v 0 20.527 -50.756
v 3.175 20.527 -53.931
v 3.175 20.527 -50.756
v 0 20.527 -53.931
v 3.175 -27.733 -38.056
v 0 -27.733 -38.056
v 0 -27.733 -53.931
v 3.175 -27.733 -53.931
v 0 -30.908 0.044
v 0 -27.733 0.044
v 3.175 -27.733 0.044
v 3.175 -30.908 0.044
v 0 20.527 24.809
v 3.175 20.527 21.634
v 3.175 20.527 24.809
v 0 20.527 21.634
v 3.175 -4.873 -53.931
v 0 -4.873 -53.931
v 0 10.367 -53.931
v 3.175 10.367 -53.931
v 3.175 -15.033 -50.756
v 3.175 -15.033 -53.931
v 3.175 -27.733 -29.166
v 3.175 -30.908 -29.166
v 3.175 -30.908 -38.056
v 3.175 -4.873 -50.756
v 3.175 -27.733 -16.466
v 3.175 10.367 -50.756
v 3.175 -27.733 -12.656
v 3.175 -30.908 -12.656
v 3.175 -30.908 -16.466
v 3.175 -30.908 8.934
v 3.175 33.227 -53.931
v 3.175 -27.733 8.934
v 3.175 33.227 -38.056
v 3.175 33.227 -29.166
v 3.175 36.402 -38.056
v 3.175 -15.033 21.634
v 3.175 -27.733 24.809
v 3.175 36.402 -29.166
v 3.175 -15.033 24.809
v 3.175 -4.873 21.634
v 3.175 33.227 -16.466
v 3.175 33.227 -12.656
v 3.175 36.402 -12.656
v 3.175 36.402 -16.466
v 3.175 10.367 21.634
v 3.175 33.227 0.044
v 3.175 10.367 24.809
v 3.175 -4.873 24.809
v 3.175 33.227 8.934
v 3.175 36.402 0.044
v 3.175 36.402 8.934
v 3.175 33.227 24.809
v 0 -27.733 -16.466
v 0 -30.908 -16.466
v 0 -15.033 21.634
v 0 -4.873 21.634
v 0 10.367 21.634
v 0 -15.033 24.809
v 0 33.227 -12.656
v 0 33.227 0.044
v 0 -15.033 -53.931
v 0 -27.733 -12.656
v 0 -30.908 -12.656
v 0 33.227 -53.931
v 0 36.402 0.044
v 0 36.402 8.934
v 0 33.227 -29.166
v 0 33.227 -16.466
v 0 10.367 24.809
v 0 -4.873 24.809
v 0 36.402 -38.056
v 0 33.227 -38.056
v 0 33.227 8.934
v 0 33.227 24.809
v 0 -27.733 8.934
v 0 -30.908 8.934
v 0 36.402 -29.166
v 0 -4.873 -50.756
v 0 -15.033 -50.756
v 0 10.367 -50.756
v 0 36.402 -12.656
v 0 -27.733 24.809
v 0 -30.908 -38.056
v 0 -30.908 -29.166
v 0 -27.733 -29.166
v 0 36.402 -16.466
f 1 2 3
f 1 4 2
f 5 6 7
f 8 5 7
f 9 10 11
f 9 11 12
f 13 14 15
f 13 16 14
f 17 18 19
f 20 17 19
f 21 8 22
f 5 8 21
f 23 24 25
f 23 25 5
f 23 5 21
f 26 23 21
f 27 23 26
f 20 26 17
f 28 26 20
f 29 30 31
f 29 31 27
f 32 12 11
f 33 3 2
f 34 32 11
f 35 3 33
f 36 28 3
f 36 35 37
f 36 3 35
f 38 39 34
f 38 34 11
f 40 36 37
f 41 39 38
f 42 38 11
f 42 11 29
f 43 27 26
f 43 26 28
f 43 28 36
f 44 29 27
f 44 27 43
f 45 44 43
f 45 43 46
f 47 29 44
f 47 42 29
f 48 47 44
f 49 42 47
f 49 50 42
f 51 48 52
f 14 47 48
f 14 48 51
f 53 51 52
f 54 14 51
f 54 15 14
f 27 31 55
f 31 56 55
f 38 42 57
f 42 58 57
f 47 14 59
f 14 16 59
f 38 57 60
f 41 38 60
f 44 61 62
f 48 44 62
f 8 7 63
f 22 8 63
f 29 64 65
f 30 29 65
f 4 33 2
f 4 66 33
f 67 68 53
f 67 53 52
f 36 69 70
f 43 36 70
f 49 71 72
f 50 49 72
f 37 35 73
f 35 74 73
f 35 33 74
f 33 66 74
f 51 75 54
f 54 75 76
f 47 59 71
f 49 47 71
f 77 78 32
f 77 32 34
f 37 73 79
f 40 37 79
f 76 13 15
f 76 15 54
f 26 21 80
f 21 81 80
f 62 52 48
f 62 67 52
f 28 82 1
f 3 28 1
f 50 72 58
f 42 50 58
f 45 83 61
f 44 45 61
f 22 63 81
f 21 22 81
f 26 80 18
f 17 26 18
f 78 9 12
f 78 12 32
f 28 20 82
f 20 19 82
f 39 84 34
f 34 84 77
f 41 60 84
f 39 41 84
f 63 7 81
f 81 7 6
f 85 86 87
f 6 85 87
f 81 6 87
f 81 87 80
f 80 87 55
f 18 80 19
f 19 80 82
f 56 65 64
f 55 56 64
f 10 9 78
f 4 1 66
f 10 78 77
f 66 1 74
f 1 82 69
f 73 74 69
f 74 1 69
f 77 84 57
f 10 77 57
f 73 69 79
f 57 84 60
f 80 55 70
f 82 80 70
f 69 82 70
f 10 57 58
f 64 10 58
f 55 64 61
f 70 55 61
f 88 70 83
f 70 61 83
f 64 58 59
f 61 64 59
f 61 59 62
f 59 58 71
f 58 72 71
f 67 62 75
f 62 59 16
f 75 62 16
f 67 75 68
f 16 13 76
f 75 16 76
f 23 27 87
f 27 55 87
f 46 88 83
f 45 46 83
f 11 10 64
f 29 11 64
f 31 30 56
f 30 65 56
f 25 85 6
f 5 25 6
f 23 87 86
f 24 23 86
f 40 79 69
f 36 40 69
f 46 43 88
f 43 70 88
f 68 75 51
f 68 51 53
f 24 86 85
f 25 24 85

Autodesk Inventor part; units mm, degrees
ref_plane "YZ Plane" through (0, 0, 0) normal (1, 0, 0) x (0, 1, 0)
ref_plane "XZ Plane" through (0, 0, 0) normal (0, 1, 0) x (-1, 0, 0)
ref_plane "XY Plane" through (0, 0, 0) normal (0, 0, 1) x (1, 0, 0)
sketch "Sketch1" plane through (0, 0, 0) normal (1, 0, 0) x (0, 1, 0)
  line L0 (33.2271, 21.6336) -> (-27.7329, 21.6336)
  line L1 (-27.7329, 21.6336) -> (-27.7329, -50.7564)
  line L2 (-27.7329, -50.7564) -> (33.2271, -50.7564)
  line L3 (33.2271, -50.7564) -> (33.2271, 21.6336)
  line L4 (33.2271, -38.0564) -> (36.4021, -38.0564)
  line L5 (36.4021, -38.0564) -> (36.4021, -29.1664)
  line L6 (36.4021, -29.1664) -> (33.2271, -29.1664)
  line L7 (33.2271, -29.1664) -> (33.2271, -38.0564)
  line L8 (33.2271, 8.9336) -> (36.4021, 8.9336)
  line L9 (36.4021, 8.9336) -> (36.4021, 0.0436)
  line L10 (36.4021, 0.0436) -> (33.2271, 0.0436)
  line L11 (33.2271, 0.0436) -> (33.2271, 8.9336)
  line L12 (33.2271, -16.4664) -> (36.4021, -16.4664)
  line L13 (36.4021, -16.4664) -> (36.4021, -12.6564)
  line L14 (36.4021, -12.6564) -> (33.2271, -12.6564)
  line L15 (33.2271, -12.6564) -> (33.2271, -16.4664)
  line L16 (33.2271, 21.6336) -> (20.5271, 21.6336)
  line L17 (20.5271, 21.6336) -> (20.5271, 24.8086)
  line L18 (20.5271, 24.8086) -> (33.2271, 24.8086)
  line L19 (33.2271, 24.8086) -> (33.2271, 21.6336)
  line L20 (-27.7329, 21.6336) -> (-15.0329, 21.6336)
  line L21 (-15.0329, 21.6336) -> (-15.0329, 24.8086)
  line L22 (-15.0329, 24.8086) -> (-27.7329, 24.8086)
  line L23 (-27.7329, 24.8086) -> (-27.7329, 21.6336)
  line L24 (-4.8729, 21.6336) -> (10.3671, 21.6336)
  line L25 (10.3671, 21.6336) -> (10.3671, 24.8086)
  line L26 (10.3671, 24.8086) -> (-4.8729, 24.8086)
  line L27 (-4.8729, 24.8086) -> (-4.8729, 21.6336)
  point P0 (0, 0)
  dimension "d0" = 60.96
  dimension "d1" = 72.39
  dimension "d2" = 12.7
  dimension "d3" = 8.89
  dimension "d4" = 3.175
  dimension "d5" = 8.89
  dimension "d6" = 12.7
  dimension "d7" = 12.7
  dimension "d8" = 12.7
  dimension "d11" = 3.175
  dimension "d12" = 12.7
  dimension "d13" = 12.7
  dimension "d14" = 10.16
  dimension "d15" = 10.16
ref_plane "Work Plane1" through (0, 2.7471, 0.0436) normal (0, 1, 0) x (1, 0, 0)
extrude "Extrusion3" add sketch "Sketch1" along normal blind 3.175
ref_plane "Work Plane2" through (0, -15.0329, -14.5614) normal (0, 0, 1) x (1, 0, 0)
mirror "Mirror2" about plane through (0, -15.0329, -14.5614) normal (0, 0, 1) of "Extrusion3"
mirror "Mirror3" about plane through (0, 2.7471, 0.0436) normal (0, 1, 0) of "Extrusion3"
